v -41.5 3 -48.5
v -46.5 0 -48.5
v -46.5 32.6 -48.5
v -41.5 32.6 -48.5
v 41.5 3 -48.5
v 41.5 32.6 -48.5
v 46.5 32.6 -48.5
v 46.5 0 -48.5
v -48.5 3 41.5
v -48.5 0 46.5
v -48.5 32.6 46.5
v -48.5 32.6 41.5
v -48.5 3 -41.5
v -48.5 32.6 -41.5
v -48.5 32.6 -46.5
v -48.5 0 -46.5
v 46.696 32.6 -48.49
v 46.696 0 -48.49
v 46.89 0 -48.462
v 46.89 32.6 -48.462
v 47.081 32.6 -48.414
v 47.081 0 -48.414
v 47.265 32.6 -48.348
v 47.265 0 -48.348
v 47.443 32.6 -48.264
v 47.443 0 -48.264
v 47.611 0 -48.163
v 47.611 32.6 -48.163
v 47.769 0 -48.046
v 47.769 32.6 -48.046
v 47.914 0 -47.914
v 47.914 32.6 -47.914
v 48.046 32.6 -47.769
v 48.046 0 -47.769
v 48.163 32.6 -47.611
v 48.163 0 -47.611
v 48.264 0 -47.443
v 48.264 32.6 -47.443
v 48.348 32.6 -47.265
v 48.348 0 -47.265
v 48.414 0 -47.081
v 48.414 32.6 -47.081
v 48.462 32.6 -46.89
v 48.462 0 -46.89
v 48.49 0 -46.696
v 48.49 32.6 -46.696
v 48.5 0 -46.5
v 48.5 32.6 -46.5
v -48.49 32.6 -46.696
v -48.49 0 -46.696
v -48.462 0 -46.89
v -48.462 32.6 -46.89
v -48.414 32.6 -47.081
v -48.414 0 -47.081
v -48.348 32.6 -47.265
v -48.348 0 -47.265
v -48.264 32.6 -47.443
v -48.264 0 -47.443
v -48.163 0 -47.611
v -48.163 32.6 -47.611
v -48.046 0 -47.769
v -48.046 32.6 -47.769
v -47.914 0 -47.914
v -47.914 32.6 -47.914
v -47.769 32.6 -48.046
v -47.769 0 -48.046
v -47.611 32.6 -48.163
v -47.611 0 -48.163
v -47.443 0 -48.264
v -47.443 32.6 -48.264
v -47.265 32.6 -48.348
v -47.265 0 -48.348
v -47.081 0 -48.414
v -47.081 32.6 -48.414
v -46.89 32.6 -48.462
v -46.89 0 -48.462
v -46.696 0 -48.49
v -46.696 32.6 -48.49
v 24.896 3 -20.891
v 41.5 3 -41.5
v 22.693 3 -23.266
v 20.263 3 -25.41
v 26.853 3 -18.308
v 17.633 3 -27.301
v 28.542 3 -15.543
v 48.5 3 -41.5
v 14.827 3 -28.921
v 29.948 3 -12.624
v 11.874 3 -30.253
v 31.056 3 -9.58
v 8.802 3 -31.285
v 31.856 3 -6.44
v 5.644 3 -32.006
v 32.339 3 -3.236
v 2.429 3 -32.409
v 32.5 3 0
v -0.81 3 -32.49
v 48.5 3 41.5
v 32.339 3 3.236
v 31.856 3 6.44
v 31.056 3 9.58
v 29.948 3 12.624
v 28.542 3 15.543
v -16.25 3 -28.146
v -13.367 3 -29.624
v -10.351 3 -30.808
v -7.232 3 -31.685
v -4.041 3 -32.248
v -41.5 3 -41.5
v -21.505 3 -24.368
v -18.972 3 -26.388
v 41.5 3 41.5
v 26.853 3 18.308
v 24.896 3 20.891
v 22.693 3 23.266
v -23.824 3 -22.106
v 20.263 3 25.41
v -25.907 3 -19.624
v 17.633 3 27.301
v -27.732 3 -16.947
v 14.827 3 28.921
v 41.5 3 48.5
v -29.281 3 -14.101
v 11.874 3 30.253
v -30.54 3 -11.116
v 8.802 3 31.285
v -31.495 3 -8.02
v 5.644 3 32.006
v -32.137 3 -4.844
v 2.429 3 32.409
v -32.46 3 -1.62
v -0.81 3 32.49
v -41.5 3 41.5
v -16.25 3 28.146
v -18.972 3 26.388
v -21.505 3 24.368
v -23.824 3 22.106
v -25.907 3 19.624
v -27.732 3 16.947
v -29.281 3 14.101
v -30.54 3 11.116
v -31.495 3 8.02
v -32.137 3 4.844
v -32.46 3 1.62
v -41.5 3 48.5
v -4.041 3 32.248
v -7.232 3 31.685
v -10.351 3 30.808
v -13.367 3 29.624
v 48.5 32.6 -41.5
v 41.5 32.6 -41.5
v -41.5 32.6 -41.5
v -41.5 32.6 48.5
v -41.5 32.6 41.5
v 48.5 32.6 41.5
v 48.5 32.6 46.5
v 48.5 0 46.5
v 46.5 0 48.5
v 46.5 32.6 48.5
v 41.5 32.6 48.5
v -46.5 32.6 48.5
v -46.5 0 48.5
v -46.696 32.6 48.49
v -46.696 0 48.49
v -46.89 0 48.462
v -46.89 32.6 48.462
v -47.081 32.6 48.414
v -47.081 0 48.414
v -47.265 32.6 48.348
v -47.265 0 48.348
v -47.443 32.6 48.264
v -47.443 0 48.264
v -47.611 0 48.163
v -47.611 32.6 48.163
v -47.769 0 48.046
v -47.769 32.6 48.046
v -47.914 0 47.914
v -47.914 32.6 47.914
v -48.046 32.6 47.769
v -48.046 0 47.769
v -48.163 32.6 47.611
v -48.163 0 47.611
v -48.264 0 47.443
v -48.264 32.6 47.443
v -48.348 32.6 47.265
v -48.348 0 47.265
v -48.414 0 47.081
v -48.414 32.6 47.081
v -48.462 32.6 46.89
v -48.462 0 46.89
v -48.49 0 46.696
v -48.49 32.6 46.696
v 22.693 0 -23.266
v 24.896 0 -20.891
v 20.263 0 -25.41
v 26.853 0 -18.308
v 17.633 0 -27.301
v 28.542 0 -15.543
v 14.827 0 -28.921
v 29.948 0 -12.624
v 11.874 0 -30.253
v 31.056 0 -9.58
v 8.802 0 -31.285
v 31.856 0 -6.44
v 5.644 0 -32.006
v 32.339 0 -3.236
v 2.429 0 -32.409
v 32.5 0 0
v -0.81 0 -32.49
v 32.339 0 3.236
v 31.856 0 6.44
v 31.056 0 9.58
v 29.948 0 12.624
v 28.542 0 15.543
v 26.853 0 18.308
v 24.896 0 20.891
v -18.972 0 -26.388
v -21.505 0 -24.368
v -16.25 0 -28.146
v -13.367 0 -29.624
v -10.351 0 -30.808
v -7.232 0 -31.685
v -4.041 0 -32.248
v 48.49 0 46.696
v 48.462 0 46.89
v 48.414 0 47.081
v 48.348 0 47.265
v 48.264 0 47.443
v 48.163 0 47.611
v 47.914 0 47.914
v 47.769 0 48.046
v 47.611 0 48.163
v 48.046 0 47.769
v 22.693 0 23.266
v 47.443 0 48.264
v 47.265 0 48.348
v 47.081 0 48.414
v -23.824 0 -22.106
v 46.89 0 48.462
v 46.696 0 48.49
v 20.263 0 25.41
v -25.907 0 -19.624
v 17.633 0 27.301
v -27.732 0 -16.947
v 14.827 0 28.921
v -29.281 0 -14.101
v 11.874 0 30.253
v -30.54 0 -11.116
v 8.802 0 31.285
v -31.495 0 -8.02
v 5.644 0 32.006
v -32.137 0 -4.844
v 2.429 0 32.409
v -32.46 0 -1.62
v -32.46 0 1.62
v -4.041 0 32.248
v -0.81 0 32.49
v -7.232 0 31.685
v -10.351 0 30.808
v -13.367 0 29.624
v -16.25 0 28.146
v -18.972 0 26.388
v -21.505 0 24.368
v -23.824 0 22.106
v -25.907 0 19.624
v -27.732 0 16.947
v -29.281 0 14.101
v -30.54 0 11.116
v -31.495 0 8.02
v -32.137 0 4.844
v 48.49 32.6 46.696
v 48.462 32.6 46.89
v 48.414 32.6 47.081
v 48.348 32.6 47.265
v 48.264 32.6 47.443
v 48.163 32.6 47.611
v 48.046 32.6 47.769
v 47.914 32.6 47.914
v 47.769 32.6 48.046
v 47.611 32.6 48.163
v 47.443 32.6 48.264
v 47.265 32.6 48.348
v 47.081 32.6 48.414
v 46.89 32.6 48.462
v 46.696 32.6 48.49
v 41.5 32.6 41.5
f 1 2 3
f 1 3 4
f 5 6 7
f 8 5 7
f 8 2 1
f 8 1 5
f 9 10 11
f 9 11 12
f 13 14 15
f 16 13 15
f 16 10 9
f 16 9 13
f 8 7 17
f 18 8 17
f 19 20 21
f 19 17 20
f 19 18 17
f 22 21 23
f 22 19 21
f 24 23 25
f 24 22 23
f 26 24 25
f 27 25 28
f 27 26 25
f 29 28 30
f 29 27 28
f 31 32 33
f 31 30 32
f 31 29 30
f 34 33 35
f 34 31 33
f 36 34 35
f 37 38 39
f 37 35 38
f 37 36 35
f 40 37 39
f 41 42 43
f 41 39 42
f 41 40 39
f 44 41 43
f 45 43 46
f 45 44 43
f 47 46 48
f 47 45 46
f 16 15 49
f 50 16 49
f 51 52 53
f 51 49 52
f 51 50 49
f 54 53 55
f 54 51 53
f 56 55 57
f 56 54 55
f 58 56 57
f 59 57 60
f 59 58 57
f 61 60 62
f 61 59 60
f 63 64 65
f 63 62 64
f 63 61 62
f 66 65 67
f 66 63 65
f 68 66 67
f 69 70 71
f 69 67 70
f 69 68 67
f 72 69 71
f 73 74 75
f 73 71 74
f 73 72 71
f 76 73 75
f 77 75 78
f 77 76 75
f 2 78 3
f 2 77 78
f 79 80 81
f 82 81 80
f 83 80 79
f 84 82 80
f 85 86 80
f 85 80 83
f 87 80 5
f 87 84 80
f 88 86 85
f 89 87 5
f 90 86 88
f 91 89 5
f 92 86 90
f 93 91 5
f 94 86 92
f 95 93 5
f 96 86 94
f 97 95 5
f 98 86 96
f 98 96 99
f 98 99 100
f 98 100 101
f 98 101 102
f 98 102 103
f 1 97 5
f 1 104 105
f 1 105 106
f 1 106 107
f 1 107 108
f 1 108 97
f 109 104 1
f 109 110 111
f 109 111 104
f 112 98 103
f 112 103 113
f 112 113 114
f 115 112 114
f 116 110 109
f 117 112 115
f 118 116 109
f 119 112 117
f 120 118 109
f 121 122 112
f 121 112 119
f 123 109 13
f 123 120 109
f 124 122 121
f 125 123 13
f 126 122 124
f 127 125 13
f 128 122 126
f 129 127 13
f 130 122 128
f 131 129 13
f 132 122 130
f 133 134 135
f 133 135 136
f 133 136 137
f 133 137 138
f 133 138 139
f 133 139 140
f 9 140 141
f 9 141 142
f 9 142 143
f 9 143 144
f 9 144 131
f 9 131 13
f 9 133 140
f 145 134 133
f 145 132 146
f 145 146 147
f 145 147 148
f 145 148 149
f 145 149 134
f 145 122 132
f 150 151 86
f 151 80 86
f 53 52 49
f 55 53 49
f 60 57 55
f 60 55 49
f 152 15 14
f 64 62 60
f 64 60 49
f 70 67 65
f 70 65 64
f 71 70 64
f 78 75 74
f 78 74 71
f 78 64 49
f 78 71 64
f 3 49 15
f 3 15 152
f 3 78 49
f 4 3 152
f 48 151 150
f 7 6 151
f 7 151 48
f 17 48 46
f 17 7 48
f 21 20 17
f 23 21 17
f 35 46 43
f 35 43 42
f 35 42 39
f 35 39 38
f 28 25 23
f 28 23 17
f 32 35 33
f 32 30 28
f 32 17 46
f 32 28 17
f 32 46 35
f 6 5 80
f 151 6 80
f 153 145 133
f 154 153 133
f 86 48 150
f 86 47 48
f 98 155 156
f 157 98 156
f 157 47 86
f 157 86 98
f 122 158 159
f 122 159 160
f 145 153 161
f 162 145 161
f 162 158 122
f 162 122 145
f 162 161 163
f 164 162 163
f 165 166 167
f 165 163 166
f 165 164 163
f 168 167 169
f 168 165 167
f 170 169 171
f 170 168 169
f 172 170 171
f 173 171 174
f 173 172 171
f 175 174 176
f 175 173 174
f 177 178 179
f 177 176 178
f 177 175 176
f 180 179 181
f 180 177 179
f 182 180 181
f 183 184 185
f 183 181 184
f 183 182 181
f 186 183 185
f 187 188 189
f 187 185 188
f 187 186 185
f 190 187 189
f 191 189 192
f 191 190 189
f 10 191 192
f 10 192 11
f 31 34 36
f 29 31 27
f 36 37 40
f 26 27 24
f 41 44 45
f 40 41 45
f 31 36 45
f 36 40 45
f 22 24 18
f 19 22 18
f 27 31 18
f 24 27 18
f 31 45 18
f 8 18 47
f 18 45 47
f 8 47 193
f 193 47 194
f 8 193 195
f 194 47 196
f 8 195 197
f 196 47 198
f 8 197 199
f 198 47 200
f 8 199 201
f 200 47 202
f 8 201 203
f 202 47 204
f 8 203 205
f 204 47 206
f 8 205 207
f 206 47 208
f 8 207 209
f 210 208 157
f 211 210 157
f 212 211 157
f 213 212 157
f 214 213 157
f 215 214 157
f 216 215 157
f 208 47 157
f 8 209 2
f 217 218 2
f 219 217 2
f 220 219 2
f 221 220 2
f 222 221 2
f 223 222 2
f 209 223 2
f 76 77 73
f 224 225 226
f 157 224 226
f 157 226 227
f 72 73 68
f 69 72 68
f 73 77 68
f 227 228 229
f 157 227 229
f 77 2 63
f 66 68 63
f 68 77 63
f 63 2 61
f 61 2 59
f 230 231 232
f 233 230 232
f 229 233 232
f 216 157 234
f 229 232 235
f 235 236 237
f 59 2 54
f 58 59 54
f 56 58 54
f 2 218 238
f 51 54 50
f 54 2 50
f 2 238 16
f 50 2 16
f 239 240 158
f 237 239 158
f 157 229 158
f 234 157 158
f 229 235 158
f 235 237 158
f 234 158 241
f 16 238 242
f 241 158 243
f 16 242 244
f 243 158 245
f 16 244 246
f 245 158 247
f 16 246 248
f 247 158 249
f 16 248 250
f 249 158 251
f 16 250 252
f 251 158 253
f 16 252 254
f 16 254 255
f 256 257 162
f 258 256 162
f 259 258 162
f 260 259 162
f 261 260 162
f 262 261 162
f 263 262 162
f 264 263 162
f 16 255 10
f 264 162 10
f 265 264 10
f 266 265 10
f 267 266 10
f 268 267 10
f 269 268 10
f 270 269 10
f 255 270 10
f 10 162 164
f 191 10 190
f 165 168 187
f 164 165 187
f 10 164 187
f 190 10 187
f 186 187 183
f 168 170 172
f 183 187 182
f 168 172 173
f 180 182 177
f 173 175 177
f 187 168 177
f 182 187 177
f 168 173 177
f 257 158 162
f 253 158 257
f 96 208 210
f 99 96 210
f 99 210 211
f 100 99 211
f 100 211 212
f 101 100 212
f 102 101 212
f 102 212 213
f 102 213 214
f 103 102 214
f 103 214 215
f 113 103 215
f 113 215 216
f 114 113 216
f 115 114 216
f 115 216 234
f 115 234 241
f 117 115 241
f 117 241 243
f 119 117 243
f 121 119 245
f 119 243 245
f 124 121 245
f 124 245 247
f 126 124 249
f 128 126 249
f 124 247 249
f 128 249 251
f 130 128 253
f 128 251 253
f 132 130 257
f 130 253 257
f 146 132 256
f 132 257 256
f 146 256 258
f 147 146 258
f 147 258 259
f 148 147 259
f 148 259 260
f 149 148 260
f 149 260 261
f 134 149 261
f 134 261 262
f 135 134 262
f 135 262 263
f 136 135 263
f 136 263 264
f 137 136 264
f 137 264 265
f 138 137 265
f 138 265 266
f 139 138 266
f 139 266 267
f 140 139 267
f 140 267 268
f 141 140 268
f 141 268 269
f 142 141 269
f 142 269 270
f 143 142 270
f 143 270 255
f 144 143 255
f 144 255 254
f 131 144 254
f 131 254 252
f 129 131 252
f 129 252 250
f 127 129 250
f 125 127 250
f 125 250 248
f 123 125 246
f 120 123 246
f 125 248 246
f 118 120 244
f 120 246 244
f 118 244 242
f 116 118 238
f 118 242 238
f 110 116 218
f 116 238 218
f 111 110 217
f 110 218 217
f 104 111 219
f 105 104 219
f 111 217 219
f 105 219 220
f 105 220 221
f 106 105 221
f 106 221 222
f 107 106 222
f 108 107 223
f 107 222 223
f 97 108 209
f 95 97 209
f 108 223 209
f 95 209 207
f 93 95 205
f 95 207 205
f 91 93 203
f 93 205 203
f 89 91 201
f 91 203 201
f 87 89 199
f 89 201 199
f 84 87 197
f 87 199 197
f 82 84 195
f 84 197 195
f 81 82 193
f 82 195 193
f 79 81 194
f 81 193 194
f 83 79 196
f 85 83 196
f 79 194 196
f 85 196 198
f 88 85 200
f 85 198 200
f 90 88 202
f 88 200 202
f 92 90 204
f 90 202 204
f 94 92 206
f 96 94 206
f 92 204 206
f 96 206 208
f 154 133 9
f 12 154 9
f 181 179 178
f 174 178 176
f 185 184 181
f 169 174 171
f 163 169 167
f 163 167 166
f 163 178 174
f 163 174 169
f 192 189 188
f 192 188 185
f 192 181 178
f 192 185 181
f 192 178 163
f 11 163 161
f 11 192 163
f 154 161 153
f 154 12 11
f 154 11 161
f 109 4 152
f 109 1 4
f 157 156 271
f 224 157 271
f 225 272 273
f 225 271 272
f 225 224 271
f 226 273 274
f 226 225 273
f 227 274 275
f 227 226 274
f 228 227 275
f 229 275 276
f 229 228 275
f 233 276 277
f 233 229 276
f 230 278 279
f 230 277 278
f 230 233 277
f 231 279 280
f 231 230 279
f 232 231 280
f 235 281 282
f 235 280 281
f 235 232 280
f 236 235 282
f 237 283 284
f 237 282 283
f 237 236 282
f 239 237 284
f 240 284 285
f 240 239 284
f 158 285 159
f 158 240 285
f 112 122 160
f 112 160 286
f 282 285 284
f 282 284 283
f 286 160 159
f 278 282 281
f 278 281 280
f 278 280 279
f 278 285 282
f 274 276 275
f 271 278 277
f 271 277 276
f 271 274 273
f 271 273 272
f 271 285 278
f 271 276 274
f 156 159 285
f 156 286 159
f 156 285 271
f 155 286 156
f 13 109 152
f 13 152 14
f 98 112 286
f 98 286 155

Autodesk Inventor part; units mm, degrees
ref_plane "YZ Plane" through (0, 0, 0) normal (1, 0, 0) x (0, 1, 0)
ref_plane "XZ Plane" through (0, 0, 0) normal (0, 1, 0) x (-1, 0, 0)
ref_plane "XY Plane" through (0, 0, 0) normal (0, 0, 1) x (1, 0, 0)
sketch "Esboço1" plane through (0, 0, 0) normal (0, 1, 0) x (-1, 0, 0)
  line L0 (-46.5, 48.5) -> (46.5, 48.5)
  line L1 (48.5, 46.5) -> (48.5, -46.5)
  line L2 (46.5, -48.5) -> (-46.5, -48.5)
  line L3 (-48.5, -46.5) -> (-48.5, 46.5)
  line L4 (-48.5, 48.5) -> (48.5, -48.5) construction
  line L5 (48.5, 48.5) -> (-48.5, -48.5) construction
  arc A0 (48.5, 46.5) -> (46.5, 48.5) centre (46.5, 46.5) ccw
  arc A1 (-46.5, 48.5) -> (-48.5, 46.5) centre (-46.5, 46.5) ccw
  arc A2 (-48.5, -46.5) -> (-46.5, -48.5) centre (-46.5, -46.5) ccw
  arc A3 (46.5, -48.5) -> (48.5, -46.5) centre (46.5, -46.5) ccw
  point P0 (0, 0)
  dimension "d0" = 97
  dimension "d1" = 97
  dimension "d2" = 2
extrude "Extrusão1" add sketch "Esboço1" along normal blind 3
sketch "Esboço2" plane through (0, 3, 0) normal (0, 1, 0) x (1, 0, 0)
  line L0 (-46.5, -48.5) -> (46.5, -48.5) projected
  arc A0 (46.5, -48.5) -> (48.5, -46.5) centre (46.5, -46.5) ccw projected
  line L1 (48.5, -46.5) -> (48.5, 46.5) projected
  arc A1 (48.5, 46.5) -> (46.5, 48.5) centre (46.5, 46.5) ccw projected
  line L2 (46.5, 48.5) -> (-46.5, 48.5) projected
  arc A2 (-46.5, 48.5) -> (-48.5, 46.5) centre (-46.5, 46.5) ccw projected
  line L3 (-48.5, 46.5) -> (-48.5, -46.5) projected
  arc A3 (-48.5, -46.5) -> (-46.5, -48.5) centre (-46.5, -46.5) ccw projected
  line L4 (-46.5, -48.5) -> (-41.5, -48.5)
  line L5 (-41.5, -48.5) -> (-41.5, -41.5)
  line L6 (-41.5, -41.5) -> (-48.5, -41.5)
  line L7 (-48.5, -41.5) -> (-48.5, -46.5)
  line L8 (-46.5, 48.5) -> (-41.5, 48.5)
  line L9 (-41.5, 48.5) -> (-41.5, 41.5)
  line L10 (-41.5, 41.5) -> (-48.5, 41.5)
  line L11 (-48.5, 41.5) -> (-48.5, 46.5)
  line L12 (46.5, -48.5) -> (41.5, -48.5)
  line L13 (41.5, -48.5) -> (41.5, -41.5)
  line L14 (41.5, -41.5) -> (48.5, -41.5)
  line L15 (48.5, -41.5) -> (48.5, -46.5)
  line L16 (46.5, 48.5) -> (41.5, 48.5)
  line L17 (41.5, 48.5) -> (41.5, 41.5)
  line L18 (41.5, 41.5) -> (48.5, 41.5)
  line L19 (48.5, 41.5) -> (48.5, 46.5)
  arc A4 (-48.5, -46.5) -> (-46.5, -48.5) centre (-46.5, -46.5) ccw
  arc A5 (-46.5, 48.5) -> (-48.5, 46.5) centre (-46.5, 46.5) ccw
  arc A6 (48.5, 46.5) -> (46.5, 48.5) centre (46.5, 46.5) ccw
  arc A7 (46.5, -48.5) -> (48.5, -46.5) centre (46.5, -46.5) ccw
  point P0 (0, 0)
  point P1 (-48.5, -48.5)
  point P2 (48.5, 48.5)
  dimension "d6" = 7
  dimension "d7" = 7
  dimension "d8" = 7
  dimension "d9" = 7
  dimension "d10" = 7
  dimension "d11" = 7
  dimension "d12" = 7
  dimension "d13" = 7
  dimension "d14" = 2
sketch "Esboço3" plane through (0, 0, 0) normal (0, -1, 0) x (1, 0, 0)
  circle A0 centre (0, 0) radius 32.5
  dimension "d15" = 65
extrude "Extrusão2" cut sketch "Esboço3" against normal blind 3
extrude "Extrusão3" add sketch "Esboço2" along normal blind 29.6 contours A3 L3 L6 L5 L0 | L13 L14 L1 A0 L0 | L3 A2 L2 L9 L10 | L18 L17 L2 A1 L1
properties part number "suporte interno"
